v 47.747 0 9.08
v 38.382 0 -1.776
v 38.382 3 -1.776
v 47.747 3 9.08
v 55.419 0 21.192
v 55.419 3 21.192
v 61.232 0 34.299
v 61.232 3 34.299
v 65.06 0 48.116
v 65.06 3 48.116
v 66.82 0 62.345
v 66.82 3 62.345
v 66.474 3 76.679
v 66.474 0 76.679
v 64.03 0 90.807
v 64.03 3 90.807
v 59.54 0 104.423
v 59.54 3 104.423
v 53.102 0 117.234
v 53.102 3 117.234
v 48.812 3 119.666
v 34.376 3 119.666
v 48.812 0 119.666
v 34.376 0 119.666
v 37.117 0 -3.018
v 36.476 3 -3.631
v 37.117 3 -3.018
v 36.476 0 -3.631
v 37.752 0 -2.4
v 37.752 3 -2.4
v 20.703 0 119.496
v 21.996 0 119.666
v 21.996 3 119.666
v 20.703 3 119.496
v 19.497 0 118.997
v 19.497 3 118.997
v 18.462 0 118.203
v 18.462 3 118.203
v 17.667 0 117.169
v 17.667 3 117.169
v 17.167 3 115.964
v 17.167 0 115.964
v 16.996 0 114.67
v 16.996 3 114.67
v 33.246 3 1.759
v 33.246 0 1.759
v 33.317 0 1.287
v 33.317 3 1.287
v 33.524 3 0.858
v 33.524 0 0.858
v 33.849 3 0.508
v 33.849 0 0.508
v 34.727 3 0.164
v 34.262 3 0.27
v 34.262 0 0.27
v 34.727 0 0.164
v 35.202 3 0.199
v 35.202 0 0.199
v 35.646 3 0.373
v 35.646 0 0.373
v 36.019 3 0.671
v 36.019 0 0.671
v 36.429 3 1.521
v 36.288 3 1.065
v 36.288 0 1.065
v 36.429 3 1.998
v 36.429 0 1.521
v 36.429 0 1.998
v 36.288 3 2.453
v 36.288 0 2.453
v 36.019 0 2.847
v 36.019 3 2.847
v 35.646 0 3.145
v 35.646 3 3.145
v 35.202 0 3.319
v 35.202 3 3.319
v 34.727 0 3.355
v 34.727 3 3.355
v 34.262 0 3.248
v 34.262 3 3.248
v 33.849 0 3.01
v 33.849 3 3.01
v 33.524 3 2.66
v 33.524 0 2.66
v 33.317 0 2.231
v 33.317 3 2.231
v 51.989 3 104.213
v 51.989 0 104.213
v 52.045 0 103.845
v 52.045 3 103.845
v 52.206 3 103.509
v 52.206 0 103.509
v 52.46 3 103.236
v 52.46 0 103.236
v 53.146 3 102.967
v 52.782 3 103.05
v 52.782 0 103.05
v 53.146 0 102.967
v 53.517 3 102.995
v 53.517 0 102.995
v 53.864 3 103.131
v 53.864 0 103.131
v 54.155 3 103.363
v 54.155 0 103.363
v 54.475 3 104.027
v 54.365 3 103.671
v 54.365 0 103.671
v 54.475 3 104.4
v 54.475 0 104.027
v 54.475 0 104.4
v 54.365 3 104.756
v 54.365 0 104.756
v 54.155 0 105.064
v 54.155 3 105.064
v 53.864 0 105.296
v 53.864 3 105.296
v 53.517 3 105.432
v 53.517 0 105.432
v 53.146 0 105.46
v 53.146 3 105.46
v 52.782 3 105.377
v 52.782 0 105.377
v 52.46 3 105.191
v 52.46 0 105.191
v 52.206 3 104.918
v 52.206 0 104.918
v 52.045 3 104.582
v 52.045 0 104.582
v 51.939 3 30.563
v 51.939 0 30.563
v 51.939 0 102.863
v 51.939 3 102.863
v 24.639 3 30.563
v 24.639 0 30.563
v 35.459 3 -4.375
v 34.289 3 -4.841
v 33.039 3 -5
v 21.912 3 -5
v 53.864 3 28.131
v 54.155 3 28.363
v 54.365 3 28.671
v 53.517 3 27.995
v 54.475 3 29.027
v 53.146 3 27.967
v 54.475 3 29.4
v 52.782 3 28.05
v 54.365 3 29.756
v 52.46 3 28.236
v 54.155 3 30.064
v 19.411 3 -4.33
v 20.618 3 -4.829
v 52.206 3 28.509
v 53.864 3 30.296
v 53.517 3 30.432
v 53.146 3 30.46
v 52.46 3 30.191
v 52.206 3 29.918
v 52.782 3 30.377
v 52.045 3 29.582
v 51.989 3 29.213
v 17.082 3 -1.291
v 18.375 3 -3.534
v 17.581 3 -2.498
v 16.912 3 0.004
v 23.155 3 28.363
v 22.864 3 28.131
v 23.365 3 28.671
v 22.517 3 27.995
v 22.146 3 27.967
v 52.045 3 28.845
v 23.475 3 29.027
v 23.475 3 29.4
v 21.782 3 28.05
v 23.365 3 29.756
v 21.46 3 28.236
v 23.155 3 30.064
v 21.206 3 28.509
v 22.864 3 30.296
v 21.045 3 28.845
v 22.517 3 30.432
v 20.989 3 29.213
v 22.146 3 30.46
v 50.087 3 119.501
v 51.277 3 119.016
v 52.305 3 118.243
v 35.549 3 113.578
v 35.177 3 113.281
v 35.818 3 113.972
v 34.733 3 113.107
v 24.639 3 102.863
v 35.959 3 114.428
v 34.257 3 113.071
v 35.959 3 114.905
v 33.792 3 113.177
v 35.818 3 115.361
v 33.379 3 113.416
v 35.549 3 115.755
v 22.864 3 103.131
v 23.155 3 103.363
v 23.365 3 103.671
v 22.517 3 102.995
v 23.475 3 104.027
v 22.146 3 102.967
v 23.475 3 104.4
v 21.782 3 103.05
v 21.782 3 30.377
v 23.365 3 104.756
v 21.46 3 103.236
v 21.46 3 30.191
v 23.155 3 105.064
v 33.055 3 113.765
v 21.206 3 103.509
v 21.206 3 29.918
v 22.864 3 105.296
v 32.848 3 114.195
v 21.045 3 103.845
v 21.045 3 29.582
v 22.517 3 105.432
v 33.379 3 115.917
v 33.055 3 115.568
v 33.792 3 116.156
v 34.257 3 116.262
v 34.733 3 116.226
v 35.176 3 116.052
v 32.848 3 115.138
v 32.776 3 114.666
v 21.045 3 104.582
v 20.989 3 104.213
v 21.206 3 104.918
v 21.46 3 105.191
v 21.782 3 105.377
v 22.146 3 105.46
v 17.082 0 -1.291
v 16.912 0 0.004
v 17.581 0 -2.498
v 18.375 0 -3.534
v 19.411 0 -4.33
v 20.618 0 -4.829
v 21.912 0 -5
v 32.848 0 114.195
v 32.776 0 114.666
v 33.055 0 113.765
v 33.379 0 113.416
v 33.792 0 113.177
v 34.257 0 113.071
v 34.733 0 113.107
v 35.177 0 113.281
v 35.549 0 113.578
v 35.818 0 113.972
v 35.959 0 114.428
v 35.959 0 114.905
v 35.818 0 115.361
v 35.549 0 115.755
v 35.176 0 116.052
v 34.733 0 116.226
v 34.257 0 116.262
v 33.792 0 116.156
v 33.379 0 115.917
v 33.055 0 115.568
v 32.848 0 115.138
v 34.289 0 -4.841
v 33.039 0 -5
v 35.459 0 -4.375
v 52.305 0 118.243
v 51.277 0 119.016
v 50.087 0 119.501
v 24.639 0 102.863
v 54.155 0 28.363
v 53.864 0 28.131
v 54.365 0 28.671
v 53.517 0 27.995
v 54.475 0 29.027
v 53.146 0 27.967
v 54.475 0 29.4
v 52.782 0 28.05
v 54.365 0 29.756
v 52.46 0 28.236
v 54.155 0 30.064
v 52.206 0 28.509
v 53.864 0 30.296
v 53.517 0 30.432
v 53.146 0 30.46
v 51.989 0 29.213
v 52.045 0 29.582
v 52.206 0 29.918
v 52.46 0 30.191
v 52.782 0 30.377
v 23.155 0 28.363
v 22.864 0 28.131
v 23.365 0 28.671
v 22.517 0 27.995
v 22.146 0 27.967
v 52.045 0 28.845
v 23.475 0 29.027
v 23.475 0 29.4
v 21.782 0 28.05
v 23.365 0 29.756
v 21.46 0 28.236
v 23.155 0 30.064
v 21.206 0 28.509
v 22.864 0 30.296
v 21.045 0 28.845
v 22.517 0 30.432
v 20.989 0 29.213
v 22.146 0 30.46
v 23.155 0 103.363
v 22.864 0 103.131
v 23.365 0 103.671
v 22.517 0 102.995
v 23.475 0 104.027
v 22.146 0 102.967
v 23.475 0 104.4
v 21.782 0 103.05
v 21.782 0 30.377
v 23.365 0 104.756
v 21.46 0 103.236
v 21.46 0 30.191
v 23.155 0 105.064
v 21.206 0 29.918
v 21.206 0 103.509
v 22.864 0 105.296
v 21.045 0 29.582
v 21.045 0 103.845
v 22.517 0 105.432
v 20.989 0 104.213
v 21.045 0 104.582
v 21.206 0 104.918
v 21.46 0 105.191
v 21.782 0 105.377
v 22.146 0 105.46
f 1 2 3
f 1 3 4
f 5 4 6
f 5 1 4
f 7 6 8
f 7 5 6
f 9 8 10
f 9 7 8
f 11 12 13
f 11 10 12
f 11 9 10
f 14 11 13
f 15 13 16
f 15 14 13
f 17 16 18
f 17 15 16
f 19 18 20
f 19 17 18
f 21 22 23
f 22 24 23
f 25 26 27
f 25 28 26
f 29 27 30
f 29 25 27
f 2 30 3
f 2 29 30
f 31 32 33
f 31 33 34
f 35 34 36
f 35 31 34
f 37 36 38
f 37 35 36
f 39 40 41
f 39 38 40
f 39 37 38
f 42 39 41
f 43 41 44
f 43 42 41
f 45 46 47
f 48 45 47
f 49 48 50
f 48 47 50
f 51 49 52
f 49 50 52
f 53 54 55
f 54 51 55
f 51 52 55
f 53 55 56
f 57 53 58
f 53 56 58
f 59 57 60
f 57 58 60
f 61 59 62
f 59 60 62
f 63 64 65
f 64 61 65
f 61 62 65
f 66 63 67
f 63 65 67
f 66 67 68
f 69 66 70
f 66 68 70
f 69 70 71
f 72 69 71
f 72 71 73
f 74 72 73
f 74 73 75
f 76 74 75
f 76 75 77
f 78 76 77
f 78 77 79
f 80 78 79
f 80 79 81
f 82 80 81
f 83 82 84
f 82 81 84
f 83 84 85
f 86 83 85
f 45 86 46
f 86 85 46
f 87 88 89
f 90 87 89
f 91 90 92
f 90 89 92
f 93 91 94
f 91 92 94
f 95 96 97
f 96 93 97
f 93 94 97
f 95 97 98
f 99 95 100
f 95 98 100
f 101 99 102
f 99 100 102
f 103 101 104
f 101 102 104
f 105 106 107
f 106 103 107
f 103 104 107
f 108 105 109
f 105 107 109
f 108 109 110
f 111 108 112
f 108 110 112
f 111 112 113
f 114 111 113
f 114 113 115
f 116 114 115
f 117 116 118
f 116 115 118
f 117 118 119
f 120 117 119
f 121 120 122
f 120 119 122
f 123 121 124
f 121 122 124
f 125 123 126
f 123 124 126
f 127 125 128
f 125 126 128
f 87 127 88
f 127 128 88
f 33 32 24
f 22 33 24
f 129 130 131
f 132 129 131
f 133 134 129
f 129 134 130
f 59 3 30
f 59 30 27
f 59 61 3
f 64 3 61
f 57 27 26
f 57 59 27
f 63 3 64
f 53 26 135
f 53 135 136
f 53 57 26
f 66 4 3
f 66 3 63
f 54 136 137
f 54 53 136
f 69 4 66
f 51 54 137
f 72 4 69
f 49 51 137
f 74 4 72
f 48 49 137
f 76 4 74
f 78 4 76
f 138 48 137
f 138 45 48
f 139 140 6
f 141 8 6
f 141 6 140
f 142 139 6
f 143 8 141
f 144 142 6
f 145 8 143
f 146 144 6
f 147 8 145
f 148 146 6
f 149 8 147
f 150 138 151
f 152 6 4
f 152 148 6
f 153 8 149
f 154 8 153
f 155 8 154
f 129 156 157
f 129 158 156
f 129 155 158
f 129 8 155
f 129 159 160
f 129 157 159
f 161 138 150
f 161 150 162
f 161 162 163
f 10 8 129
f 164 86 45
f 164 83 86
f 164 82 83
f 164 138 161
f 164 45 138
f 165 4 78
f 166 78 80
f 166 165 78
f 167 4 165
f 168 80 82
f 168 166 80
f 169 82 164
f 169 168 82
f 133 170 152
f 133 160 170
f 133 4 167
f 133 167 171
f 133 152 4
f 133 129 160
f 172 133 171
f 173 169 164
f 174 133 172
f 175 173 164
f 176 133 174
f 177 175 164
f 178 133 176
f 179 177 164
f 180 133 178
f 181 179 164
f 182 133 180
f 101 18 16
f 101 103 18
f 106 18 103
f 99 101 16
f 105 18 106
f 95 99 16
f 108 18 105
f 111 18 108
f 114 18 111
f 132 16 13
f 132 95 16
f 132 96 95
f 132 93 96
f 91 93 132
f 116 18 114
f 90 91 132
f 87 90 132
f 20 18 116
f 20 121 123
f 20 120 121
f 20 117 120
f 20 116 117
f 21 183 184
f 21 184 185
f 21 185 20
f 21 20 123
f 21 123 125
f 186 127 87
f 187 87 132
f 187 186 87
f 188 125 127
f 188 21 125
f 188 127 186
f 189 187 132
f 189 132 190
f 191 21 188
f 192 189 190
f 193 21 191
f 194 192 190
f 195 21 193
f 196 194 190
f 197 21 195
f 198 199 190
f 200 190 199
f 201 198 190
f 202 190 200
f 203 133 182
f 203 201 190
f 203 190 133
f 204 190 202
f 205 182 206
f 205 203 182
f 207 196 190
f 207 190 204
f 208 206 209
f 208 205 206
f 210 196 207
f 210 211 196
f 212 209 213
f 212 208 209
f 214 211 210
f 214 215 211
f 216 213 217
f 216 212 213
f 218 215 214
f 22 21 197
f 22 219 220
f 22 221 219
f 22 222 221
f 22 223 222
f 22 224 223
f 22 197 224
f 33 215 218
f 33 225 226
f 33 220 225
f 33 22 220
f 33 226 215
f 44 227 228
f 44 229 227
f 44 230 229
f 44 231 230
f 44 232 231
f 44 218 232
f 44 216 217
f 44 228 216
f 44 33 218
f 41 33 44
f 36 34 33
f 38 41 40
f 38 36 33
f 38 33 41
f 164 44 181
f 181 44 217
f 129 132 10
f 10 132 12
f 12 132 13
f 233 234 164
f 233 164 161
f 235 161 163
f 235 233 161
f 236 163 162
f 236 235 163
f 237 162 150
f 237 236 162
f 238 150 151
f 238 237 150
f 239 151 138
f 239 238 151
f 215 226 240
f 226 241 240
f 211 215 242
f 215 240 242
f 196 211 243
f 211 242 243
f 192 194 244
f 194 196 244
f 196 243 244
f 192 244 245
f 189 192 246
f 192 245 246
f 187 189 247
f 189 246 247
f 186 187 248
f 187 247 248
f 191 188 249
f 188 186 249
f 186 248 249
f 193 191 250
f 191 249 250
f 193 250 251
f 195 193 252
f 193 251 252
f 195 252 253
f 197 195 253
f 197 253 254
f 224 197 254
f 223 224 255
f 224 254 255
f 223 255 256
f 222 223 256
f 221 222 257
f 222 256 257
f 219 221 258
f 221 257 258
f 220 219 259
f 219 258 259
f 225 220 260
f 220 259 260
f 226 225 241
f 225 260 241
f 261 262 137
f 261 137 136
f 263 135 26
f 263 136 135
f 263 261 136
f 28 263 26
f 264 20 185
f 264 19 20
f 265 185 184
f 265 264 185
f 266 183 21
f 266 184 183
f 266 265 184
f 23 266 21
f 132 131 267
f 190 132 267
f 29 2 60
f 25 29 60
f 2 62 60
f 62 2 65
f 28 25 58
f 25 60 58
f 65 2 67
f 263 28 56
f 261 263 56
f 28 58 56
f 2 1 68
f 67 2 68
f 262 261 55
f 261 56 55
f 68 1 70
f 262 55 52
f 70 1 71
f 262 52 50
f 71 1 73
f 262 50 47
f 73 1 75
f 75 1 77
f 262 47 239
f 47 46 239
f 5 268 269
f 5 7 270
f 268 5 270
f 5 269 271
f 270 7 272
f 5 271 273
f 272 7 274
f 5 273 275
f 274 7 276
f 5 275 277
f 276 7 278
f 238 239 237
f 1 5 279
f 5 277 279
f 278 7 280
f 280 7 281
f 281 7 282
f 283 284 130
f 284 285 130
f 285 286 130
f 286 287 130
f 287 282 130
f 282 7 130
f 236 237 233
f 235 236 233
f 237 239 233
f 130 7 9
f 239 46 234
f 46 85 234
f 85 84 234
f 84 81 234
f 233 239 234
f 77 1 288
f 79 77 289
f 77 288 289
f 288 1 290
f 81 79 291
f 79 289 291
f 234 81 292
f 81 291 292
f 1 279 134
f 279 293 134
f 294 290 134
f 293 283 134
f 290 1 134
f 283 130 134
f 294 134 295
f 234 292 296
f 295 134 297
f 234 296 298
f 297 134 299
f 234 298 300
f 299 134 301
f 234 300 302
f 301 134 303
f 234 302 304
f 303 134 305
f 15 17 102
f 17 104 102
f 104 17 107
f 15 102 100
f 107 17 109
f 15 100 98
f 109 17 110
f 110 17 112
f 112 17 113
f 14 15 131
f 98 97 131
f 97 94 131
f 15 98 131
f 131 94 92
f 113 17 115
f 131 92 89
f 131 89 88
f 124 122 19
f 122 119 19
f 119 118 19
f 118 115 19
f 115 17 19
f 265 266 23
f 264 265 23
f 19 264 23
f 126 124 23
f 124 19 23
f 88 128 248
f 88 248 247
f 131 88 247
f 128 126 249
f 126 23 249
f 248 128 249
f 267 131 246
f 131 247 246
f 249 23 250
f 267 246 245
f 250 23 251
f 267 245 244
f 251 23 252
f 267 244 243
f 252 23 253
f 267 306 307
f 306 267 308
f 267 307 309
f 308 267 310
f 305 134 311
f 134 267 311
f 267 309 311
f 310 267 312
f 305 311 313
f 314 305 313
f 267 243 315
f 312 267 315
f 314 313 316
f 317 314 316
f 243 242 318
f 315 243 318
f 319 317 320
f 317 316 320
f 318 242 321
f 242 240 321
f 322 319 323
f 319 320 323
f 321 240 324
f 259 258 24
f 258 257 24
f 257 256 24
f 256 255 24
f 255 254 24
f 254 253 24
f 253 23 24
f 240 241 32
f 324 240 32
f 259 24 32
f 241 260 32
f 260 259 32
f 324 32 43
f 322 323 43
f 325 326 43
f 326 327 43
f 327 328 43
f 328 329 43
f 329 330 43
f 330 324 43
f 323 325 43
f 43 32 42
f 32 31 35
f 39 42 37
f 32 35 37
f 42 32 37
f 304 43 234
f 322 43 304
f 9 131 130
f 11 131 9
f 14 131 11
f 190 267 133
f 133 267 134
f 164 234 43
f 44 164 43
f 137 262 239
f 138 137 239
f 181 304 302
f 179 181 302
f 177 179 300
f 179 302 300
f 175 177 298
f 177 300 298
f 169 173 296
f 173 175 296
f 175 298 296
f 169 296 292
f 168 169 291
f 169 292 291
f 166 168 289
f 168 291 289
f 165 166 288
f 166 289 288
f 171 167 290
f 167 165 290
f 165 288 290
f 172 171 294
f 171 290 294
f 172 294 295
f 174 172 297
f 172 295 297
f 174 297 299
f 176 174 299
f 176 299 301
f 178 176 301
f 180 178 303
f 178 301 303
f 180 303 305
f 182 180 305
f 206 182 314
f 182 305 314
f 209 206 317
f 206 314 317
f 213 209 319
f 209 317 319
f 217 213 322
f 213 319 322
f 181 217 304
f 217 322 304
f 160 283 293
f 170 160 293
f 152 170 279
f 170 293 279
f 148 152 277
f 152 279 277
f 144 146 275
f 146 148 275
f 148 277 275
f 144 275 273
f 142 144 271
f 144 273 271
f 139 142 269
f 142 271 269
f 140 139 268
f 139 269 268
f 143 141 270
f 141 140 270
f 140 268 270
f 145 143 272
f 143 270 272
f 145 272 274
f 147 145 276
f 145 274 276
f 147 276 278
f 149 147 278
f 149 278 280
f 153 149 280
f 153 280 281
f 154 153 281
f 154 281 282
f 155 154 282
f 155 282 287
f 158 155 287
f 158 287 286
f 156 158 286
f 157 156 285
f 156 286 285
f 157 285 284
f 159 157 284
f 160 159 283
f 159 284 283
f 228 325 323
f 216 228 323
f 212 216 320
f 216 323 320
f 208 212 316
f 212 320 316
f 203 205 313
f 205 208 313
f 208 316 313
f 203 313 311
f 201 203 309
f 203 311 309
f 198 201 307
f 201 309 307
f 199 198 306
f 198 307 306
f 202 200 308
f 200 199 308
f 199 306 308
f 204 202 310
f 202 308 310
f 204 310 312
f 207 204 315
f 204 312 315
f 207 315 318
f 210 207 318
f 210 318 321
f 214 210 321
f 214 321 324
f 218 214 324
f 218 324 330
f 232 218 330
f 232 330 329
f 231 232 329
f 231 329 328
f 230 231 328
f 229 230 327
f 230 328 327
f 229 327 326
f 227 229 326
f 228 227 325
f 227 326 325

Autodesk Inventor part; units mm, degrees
ref_plane "YZ Plane" through (0, 0, 0) normal (1, 0, 0) x (0, 1, 0)
ref_plane "XZ Plane" through (0, 0, 0) normal (0, 1, 0) x (-1, 0, 0)
ref_plane "XY Plane" through (0, 0, 0) normal (0, 0, 1) x (1, 0, 0)
sketch "Sketch1" plane through (0, 0, 0) normal (0, 1, 0) x (-1, 0, 0)
  circle A0 centre (-34.3765, 114.6665) radius 1.6
  circle A1 centre (-34.8464, 1.7591) radius 1.6
  arc A2 (-53.1019, 117.2341) -> (-38.3819, -1.7764) centre (30.561, 67.1665) ccw
  line L0 (-34.3765, 119.6665) -> (-48.8115, 119.6665)
  arc A3 (-38.3819, -1.7764) -> (-36.4764, -3.6306) centre (30.561, 67.1665) ccw
  line L1 (-33.0386, -5) -> (-21.9122, -5)
  line L2 (-16.9122, 0.0037) -> (-16.9963, 114.6702)
  line L3 (-21.9963, 119.6665) -> (-34.3765, 119.6665)
  arc A4 (-48.8115, 119.6665) -> (-53.1019, 117.2341) centre (-48.8115, 114.6665) ccw
  arc A5 (-36.4764, -3.6306) -> (-33.0386, -5) centre (-33.0386, 0) ccw
  circle A6 centre (-22.239, 104.2134) radius 1.25
  circle A7 centre (-53.239, 104.2134) radius 1.25
  circle A8 centre (-53.239, 29.2134) radius 1.25
  circle A9 centre (-22.239, 29.2134) radius 1.25
  line L4 (-24.639, 102.8634) -> (-24.639, 30.5634)
  line L5 (-24.639, 30.5634) -> (-51.939, 30.5634)
  line L6 (-51.939, 30.5634) -> (-51.939, 102.8634)
  line L7 (-51.939, 102.8634) -> (-24.639, 102.8634)
  arc A10 (-21.9122, -5) -> (-16.9122, 0.0037) centre (-21.9122, 0) ccw
  arc A11 (-16.9963, 114.6702) -> (-21.9963, 119.6665) centre (-21.9963, 114.6665) ccw
  point P0 (0, 0)
extrude "Extrusion1" add sketch "Sketch1" along normal blind 3
properties part number "LCD Plate" material "Polycarbonate, Clear"
